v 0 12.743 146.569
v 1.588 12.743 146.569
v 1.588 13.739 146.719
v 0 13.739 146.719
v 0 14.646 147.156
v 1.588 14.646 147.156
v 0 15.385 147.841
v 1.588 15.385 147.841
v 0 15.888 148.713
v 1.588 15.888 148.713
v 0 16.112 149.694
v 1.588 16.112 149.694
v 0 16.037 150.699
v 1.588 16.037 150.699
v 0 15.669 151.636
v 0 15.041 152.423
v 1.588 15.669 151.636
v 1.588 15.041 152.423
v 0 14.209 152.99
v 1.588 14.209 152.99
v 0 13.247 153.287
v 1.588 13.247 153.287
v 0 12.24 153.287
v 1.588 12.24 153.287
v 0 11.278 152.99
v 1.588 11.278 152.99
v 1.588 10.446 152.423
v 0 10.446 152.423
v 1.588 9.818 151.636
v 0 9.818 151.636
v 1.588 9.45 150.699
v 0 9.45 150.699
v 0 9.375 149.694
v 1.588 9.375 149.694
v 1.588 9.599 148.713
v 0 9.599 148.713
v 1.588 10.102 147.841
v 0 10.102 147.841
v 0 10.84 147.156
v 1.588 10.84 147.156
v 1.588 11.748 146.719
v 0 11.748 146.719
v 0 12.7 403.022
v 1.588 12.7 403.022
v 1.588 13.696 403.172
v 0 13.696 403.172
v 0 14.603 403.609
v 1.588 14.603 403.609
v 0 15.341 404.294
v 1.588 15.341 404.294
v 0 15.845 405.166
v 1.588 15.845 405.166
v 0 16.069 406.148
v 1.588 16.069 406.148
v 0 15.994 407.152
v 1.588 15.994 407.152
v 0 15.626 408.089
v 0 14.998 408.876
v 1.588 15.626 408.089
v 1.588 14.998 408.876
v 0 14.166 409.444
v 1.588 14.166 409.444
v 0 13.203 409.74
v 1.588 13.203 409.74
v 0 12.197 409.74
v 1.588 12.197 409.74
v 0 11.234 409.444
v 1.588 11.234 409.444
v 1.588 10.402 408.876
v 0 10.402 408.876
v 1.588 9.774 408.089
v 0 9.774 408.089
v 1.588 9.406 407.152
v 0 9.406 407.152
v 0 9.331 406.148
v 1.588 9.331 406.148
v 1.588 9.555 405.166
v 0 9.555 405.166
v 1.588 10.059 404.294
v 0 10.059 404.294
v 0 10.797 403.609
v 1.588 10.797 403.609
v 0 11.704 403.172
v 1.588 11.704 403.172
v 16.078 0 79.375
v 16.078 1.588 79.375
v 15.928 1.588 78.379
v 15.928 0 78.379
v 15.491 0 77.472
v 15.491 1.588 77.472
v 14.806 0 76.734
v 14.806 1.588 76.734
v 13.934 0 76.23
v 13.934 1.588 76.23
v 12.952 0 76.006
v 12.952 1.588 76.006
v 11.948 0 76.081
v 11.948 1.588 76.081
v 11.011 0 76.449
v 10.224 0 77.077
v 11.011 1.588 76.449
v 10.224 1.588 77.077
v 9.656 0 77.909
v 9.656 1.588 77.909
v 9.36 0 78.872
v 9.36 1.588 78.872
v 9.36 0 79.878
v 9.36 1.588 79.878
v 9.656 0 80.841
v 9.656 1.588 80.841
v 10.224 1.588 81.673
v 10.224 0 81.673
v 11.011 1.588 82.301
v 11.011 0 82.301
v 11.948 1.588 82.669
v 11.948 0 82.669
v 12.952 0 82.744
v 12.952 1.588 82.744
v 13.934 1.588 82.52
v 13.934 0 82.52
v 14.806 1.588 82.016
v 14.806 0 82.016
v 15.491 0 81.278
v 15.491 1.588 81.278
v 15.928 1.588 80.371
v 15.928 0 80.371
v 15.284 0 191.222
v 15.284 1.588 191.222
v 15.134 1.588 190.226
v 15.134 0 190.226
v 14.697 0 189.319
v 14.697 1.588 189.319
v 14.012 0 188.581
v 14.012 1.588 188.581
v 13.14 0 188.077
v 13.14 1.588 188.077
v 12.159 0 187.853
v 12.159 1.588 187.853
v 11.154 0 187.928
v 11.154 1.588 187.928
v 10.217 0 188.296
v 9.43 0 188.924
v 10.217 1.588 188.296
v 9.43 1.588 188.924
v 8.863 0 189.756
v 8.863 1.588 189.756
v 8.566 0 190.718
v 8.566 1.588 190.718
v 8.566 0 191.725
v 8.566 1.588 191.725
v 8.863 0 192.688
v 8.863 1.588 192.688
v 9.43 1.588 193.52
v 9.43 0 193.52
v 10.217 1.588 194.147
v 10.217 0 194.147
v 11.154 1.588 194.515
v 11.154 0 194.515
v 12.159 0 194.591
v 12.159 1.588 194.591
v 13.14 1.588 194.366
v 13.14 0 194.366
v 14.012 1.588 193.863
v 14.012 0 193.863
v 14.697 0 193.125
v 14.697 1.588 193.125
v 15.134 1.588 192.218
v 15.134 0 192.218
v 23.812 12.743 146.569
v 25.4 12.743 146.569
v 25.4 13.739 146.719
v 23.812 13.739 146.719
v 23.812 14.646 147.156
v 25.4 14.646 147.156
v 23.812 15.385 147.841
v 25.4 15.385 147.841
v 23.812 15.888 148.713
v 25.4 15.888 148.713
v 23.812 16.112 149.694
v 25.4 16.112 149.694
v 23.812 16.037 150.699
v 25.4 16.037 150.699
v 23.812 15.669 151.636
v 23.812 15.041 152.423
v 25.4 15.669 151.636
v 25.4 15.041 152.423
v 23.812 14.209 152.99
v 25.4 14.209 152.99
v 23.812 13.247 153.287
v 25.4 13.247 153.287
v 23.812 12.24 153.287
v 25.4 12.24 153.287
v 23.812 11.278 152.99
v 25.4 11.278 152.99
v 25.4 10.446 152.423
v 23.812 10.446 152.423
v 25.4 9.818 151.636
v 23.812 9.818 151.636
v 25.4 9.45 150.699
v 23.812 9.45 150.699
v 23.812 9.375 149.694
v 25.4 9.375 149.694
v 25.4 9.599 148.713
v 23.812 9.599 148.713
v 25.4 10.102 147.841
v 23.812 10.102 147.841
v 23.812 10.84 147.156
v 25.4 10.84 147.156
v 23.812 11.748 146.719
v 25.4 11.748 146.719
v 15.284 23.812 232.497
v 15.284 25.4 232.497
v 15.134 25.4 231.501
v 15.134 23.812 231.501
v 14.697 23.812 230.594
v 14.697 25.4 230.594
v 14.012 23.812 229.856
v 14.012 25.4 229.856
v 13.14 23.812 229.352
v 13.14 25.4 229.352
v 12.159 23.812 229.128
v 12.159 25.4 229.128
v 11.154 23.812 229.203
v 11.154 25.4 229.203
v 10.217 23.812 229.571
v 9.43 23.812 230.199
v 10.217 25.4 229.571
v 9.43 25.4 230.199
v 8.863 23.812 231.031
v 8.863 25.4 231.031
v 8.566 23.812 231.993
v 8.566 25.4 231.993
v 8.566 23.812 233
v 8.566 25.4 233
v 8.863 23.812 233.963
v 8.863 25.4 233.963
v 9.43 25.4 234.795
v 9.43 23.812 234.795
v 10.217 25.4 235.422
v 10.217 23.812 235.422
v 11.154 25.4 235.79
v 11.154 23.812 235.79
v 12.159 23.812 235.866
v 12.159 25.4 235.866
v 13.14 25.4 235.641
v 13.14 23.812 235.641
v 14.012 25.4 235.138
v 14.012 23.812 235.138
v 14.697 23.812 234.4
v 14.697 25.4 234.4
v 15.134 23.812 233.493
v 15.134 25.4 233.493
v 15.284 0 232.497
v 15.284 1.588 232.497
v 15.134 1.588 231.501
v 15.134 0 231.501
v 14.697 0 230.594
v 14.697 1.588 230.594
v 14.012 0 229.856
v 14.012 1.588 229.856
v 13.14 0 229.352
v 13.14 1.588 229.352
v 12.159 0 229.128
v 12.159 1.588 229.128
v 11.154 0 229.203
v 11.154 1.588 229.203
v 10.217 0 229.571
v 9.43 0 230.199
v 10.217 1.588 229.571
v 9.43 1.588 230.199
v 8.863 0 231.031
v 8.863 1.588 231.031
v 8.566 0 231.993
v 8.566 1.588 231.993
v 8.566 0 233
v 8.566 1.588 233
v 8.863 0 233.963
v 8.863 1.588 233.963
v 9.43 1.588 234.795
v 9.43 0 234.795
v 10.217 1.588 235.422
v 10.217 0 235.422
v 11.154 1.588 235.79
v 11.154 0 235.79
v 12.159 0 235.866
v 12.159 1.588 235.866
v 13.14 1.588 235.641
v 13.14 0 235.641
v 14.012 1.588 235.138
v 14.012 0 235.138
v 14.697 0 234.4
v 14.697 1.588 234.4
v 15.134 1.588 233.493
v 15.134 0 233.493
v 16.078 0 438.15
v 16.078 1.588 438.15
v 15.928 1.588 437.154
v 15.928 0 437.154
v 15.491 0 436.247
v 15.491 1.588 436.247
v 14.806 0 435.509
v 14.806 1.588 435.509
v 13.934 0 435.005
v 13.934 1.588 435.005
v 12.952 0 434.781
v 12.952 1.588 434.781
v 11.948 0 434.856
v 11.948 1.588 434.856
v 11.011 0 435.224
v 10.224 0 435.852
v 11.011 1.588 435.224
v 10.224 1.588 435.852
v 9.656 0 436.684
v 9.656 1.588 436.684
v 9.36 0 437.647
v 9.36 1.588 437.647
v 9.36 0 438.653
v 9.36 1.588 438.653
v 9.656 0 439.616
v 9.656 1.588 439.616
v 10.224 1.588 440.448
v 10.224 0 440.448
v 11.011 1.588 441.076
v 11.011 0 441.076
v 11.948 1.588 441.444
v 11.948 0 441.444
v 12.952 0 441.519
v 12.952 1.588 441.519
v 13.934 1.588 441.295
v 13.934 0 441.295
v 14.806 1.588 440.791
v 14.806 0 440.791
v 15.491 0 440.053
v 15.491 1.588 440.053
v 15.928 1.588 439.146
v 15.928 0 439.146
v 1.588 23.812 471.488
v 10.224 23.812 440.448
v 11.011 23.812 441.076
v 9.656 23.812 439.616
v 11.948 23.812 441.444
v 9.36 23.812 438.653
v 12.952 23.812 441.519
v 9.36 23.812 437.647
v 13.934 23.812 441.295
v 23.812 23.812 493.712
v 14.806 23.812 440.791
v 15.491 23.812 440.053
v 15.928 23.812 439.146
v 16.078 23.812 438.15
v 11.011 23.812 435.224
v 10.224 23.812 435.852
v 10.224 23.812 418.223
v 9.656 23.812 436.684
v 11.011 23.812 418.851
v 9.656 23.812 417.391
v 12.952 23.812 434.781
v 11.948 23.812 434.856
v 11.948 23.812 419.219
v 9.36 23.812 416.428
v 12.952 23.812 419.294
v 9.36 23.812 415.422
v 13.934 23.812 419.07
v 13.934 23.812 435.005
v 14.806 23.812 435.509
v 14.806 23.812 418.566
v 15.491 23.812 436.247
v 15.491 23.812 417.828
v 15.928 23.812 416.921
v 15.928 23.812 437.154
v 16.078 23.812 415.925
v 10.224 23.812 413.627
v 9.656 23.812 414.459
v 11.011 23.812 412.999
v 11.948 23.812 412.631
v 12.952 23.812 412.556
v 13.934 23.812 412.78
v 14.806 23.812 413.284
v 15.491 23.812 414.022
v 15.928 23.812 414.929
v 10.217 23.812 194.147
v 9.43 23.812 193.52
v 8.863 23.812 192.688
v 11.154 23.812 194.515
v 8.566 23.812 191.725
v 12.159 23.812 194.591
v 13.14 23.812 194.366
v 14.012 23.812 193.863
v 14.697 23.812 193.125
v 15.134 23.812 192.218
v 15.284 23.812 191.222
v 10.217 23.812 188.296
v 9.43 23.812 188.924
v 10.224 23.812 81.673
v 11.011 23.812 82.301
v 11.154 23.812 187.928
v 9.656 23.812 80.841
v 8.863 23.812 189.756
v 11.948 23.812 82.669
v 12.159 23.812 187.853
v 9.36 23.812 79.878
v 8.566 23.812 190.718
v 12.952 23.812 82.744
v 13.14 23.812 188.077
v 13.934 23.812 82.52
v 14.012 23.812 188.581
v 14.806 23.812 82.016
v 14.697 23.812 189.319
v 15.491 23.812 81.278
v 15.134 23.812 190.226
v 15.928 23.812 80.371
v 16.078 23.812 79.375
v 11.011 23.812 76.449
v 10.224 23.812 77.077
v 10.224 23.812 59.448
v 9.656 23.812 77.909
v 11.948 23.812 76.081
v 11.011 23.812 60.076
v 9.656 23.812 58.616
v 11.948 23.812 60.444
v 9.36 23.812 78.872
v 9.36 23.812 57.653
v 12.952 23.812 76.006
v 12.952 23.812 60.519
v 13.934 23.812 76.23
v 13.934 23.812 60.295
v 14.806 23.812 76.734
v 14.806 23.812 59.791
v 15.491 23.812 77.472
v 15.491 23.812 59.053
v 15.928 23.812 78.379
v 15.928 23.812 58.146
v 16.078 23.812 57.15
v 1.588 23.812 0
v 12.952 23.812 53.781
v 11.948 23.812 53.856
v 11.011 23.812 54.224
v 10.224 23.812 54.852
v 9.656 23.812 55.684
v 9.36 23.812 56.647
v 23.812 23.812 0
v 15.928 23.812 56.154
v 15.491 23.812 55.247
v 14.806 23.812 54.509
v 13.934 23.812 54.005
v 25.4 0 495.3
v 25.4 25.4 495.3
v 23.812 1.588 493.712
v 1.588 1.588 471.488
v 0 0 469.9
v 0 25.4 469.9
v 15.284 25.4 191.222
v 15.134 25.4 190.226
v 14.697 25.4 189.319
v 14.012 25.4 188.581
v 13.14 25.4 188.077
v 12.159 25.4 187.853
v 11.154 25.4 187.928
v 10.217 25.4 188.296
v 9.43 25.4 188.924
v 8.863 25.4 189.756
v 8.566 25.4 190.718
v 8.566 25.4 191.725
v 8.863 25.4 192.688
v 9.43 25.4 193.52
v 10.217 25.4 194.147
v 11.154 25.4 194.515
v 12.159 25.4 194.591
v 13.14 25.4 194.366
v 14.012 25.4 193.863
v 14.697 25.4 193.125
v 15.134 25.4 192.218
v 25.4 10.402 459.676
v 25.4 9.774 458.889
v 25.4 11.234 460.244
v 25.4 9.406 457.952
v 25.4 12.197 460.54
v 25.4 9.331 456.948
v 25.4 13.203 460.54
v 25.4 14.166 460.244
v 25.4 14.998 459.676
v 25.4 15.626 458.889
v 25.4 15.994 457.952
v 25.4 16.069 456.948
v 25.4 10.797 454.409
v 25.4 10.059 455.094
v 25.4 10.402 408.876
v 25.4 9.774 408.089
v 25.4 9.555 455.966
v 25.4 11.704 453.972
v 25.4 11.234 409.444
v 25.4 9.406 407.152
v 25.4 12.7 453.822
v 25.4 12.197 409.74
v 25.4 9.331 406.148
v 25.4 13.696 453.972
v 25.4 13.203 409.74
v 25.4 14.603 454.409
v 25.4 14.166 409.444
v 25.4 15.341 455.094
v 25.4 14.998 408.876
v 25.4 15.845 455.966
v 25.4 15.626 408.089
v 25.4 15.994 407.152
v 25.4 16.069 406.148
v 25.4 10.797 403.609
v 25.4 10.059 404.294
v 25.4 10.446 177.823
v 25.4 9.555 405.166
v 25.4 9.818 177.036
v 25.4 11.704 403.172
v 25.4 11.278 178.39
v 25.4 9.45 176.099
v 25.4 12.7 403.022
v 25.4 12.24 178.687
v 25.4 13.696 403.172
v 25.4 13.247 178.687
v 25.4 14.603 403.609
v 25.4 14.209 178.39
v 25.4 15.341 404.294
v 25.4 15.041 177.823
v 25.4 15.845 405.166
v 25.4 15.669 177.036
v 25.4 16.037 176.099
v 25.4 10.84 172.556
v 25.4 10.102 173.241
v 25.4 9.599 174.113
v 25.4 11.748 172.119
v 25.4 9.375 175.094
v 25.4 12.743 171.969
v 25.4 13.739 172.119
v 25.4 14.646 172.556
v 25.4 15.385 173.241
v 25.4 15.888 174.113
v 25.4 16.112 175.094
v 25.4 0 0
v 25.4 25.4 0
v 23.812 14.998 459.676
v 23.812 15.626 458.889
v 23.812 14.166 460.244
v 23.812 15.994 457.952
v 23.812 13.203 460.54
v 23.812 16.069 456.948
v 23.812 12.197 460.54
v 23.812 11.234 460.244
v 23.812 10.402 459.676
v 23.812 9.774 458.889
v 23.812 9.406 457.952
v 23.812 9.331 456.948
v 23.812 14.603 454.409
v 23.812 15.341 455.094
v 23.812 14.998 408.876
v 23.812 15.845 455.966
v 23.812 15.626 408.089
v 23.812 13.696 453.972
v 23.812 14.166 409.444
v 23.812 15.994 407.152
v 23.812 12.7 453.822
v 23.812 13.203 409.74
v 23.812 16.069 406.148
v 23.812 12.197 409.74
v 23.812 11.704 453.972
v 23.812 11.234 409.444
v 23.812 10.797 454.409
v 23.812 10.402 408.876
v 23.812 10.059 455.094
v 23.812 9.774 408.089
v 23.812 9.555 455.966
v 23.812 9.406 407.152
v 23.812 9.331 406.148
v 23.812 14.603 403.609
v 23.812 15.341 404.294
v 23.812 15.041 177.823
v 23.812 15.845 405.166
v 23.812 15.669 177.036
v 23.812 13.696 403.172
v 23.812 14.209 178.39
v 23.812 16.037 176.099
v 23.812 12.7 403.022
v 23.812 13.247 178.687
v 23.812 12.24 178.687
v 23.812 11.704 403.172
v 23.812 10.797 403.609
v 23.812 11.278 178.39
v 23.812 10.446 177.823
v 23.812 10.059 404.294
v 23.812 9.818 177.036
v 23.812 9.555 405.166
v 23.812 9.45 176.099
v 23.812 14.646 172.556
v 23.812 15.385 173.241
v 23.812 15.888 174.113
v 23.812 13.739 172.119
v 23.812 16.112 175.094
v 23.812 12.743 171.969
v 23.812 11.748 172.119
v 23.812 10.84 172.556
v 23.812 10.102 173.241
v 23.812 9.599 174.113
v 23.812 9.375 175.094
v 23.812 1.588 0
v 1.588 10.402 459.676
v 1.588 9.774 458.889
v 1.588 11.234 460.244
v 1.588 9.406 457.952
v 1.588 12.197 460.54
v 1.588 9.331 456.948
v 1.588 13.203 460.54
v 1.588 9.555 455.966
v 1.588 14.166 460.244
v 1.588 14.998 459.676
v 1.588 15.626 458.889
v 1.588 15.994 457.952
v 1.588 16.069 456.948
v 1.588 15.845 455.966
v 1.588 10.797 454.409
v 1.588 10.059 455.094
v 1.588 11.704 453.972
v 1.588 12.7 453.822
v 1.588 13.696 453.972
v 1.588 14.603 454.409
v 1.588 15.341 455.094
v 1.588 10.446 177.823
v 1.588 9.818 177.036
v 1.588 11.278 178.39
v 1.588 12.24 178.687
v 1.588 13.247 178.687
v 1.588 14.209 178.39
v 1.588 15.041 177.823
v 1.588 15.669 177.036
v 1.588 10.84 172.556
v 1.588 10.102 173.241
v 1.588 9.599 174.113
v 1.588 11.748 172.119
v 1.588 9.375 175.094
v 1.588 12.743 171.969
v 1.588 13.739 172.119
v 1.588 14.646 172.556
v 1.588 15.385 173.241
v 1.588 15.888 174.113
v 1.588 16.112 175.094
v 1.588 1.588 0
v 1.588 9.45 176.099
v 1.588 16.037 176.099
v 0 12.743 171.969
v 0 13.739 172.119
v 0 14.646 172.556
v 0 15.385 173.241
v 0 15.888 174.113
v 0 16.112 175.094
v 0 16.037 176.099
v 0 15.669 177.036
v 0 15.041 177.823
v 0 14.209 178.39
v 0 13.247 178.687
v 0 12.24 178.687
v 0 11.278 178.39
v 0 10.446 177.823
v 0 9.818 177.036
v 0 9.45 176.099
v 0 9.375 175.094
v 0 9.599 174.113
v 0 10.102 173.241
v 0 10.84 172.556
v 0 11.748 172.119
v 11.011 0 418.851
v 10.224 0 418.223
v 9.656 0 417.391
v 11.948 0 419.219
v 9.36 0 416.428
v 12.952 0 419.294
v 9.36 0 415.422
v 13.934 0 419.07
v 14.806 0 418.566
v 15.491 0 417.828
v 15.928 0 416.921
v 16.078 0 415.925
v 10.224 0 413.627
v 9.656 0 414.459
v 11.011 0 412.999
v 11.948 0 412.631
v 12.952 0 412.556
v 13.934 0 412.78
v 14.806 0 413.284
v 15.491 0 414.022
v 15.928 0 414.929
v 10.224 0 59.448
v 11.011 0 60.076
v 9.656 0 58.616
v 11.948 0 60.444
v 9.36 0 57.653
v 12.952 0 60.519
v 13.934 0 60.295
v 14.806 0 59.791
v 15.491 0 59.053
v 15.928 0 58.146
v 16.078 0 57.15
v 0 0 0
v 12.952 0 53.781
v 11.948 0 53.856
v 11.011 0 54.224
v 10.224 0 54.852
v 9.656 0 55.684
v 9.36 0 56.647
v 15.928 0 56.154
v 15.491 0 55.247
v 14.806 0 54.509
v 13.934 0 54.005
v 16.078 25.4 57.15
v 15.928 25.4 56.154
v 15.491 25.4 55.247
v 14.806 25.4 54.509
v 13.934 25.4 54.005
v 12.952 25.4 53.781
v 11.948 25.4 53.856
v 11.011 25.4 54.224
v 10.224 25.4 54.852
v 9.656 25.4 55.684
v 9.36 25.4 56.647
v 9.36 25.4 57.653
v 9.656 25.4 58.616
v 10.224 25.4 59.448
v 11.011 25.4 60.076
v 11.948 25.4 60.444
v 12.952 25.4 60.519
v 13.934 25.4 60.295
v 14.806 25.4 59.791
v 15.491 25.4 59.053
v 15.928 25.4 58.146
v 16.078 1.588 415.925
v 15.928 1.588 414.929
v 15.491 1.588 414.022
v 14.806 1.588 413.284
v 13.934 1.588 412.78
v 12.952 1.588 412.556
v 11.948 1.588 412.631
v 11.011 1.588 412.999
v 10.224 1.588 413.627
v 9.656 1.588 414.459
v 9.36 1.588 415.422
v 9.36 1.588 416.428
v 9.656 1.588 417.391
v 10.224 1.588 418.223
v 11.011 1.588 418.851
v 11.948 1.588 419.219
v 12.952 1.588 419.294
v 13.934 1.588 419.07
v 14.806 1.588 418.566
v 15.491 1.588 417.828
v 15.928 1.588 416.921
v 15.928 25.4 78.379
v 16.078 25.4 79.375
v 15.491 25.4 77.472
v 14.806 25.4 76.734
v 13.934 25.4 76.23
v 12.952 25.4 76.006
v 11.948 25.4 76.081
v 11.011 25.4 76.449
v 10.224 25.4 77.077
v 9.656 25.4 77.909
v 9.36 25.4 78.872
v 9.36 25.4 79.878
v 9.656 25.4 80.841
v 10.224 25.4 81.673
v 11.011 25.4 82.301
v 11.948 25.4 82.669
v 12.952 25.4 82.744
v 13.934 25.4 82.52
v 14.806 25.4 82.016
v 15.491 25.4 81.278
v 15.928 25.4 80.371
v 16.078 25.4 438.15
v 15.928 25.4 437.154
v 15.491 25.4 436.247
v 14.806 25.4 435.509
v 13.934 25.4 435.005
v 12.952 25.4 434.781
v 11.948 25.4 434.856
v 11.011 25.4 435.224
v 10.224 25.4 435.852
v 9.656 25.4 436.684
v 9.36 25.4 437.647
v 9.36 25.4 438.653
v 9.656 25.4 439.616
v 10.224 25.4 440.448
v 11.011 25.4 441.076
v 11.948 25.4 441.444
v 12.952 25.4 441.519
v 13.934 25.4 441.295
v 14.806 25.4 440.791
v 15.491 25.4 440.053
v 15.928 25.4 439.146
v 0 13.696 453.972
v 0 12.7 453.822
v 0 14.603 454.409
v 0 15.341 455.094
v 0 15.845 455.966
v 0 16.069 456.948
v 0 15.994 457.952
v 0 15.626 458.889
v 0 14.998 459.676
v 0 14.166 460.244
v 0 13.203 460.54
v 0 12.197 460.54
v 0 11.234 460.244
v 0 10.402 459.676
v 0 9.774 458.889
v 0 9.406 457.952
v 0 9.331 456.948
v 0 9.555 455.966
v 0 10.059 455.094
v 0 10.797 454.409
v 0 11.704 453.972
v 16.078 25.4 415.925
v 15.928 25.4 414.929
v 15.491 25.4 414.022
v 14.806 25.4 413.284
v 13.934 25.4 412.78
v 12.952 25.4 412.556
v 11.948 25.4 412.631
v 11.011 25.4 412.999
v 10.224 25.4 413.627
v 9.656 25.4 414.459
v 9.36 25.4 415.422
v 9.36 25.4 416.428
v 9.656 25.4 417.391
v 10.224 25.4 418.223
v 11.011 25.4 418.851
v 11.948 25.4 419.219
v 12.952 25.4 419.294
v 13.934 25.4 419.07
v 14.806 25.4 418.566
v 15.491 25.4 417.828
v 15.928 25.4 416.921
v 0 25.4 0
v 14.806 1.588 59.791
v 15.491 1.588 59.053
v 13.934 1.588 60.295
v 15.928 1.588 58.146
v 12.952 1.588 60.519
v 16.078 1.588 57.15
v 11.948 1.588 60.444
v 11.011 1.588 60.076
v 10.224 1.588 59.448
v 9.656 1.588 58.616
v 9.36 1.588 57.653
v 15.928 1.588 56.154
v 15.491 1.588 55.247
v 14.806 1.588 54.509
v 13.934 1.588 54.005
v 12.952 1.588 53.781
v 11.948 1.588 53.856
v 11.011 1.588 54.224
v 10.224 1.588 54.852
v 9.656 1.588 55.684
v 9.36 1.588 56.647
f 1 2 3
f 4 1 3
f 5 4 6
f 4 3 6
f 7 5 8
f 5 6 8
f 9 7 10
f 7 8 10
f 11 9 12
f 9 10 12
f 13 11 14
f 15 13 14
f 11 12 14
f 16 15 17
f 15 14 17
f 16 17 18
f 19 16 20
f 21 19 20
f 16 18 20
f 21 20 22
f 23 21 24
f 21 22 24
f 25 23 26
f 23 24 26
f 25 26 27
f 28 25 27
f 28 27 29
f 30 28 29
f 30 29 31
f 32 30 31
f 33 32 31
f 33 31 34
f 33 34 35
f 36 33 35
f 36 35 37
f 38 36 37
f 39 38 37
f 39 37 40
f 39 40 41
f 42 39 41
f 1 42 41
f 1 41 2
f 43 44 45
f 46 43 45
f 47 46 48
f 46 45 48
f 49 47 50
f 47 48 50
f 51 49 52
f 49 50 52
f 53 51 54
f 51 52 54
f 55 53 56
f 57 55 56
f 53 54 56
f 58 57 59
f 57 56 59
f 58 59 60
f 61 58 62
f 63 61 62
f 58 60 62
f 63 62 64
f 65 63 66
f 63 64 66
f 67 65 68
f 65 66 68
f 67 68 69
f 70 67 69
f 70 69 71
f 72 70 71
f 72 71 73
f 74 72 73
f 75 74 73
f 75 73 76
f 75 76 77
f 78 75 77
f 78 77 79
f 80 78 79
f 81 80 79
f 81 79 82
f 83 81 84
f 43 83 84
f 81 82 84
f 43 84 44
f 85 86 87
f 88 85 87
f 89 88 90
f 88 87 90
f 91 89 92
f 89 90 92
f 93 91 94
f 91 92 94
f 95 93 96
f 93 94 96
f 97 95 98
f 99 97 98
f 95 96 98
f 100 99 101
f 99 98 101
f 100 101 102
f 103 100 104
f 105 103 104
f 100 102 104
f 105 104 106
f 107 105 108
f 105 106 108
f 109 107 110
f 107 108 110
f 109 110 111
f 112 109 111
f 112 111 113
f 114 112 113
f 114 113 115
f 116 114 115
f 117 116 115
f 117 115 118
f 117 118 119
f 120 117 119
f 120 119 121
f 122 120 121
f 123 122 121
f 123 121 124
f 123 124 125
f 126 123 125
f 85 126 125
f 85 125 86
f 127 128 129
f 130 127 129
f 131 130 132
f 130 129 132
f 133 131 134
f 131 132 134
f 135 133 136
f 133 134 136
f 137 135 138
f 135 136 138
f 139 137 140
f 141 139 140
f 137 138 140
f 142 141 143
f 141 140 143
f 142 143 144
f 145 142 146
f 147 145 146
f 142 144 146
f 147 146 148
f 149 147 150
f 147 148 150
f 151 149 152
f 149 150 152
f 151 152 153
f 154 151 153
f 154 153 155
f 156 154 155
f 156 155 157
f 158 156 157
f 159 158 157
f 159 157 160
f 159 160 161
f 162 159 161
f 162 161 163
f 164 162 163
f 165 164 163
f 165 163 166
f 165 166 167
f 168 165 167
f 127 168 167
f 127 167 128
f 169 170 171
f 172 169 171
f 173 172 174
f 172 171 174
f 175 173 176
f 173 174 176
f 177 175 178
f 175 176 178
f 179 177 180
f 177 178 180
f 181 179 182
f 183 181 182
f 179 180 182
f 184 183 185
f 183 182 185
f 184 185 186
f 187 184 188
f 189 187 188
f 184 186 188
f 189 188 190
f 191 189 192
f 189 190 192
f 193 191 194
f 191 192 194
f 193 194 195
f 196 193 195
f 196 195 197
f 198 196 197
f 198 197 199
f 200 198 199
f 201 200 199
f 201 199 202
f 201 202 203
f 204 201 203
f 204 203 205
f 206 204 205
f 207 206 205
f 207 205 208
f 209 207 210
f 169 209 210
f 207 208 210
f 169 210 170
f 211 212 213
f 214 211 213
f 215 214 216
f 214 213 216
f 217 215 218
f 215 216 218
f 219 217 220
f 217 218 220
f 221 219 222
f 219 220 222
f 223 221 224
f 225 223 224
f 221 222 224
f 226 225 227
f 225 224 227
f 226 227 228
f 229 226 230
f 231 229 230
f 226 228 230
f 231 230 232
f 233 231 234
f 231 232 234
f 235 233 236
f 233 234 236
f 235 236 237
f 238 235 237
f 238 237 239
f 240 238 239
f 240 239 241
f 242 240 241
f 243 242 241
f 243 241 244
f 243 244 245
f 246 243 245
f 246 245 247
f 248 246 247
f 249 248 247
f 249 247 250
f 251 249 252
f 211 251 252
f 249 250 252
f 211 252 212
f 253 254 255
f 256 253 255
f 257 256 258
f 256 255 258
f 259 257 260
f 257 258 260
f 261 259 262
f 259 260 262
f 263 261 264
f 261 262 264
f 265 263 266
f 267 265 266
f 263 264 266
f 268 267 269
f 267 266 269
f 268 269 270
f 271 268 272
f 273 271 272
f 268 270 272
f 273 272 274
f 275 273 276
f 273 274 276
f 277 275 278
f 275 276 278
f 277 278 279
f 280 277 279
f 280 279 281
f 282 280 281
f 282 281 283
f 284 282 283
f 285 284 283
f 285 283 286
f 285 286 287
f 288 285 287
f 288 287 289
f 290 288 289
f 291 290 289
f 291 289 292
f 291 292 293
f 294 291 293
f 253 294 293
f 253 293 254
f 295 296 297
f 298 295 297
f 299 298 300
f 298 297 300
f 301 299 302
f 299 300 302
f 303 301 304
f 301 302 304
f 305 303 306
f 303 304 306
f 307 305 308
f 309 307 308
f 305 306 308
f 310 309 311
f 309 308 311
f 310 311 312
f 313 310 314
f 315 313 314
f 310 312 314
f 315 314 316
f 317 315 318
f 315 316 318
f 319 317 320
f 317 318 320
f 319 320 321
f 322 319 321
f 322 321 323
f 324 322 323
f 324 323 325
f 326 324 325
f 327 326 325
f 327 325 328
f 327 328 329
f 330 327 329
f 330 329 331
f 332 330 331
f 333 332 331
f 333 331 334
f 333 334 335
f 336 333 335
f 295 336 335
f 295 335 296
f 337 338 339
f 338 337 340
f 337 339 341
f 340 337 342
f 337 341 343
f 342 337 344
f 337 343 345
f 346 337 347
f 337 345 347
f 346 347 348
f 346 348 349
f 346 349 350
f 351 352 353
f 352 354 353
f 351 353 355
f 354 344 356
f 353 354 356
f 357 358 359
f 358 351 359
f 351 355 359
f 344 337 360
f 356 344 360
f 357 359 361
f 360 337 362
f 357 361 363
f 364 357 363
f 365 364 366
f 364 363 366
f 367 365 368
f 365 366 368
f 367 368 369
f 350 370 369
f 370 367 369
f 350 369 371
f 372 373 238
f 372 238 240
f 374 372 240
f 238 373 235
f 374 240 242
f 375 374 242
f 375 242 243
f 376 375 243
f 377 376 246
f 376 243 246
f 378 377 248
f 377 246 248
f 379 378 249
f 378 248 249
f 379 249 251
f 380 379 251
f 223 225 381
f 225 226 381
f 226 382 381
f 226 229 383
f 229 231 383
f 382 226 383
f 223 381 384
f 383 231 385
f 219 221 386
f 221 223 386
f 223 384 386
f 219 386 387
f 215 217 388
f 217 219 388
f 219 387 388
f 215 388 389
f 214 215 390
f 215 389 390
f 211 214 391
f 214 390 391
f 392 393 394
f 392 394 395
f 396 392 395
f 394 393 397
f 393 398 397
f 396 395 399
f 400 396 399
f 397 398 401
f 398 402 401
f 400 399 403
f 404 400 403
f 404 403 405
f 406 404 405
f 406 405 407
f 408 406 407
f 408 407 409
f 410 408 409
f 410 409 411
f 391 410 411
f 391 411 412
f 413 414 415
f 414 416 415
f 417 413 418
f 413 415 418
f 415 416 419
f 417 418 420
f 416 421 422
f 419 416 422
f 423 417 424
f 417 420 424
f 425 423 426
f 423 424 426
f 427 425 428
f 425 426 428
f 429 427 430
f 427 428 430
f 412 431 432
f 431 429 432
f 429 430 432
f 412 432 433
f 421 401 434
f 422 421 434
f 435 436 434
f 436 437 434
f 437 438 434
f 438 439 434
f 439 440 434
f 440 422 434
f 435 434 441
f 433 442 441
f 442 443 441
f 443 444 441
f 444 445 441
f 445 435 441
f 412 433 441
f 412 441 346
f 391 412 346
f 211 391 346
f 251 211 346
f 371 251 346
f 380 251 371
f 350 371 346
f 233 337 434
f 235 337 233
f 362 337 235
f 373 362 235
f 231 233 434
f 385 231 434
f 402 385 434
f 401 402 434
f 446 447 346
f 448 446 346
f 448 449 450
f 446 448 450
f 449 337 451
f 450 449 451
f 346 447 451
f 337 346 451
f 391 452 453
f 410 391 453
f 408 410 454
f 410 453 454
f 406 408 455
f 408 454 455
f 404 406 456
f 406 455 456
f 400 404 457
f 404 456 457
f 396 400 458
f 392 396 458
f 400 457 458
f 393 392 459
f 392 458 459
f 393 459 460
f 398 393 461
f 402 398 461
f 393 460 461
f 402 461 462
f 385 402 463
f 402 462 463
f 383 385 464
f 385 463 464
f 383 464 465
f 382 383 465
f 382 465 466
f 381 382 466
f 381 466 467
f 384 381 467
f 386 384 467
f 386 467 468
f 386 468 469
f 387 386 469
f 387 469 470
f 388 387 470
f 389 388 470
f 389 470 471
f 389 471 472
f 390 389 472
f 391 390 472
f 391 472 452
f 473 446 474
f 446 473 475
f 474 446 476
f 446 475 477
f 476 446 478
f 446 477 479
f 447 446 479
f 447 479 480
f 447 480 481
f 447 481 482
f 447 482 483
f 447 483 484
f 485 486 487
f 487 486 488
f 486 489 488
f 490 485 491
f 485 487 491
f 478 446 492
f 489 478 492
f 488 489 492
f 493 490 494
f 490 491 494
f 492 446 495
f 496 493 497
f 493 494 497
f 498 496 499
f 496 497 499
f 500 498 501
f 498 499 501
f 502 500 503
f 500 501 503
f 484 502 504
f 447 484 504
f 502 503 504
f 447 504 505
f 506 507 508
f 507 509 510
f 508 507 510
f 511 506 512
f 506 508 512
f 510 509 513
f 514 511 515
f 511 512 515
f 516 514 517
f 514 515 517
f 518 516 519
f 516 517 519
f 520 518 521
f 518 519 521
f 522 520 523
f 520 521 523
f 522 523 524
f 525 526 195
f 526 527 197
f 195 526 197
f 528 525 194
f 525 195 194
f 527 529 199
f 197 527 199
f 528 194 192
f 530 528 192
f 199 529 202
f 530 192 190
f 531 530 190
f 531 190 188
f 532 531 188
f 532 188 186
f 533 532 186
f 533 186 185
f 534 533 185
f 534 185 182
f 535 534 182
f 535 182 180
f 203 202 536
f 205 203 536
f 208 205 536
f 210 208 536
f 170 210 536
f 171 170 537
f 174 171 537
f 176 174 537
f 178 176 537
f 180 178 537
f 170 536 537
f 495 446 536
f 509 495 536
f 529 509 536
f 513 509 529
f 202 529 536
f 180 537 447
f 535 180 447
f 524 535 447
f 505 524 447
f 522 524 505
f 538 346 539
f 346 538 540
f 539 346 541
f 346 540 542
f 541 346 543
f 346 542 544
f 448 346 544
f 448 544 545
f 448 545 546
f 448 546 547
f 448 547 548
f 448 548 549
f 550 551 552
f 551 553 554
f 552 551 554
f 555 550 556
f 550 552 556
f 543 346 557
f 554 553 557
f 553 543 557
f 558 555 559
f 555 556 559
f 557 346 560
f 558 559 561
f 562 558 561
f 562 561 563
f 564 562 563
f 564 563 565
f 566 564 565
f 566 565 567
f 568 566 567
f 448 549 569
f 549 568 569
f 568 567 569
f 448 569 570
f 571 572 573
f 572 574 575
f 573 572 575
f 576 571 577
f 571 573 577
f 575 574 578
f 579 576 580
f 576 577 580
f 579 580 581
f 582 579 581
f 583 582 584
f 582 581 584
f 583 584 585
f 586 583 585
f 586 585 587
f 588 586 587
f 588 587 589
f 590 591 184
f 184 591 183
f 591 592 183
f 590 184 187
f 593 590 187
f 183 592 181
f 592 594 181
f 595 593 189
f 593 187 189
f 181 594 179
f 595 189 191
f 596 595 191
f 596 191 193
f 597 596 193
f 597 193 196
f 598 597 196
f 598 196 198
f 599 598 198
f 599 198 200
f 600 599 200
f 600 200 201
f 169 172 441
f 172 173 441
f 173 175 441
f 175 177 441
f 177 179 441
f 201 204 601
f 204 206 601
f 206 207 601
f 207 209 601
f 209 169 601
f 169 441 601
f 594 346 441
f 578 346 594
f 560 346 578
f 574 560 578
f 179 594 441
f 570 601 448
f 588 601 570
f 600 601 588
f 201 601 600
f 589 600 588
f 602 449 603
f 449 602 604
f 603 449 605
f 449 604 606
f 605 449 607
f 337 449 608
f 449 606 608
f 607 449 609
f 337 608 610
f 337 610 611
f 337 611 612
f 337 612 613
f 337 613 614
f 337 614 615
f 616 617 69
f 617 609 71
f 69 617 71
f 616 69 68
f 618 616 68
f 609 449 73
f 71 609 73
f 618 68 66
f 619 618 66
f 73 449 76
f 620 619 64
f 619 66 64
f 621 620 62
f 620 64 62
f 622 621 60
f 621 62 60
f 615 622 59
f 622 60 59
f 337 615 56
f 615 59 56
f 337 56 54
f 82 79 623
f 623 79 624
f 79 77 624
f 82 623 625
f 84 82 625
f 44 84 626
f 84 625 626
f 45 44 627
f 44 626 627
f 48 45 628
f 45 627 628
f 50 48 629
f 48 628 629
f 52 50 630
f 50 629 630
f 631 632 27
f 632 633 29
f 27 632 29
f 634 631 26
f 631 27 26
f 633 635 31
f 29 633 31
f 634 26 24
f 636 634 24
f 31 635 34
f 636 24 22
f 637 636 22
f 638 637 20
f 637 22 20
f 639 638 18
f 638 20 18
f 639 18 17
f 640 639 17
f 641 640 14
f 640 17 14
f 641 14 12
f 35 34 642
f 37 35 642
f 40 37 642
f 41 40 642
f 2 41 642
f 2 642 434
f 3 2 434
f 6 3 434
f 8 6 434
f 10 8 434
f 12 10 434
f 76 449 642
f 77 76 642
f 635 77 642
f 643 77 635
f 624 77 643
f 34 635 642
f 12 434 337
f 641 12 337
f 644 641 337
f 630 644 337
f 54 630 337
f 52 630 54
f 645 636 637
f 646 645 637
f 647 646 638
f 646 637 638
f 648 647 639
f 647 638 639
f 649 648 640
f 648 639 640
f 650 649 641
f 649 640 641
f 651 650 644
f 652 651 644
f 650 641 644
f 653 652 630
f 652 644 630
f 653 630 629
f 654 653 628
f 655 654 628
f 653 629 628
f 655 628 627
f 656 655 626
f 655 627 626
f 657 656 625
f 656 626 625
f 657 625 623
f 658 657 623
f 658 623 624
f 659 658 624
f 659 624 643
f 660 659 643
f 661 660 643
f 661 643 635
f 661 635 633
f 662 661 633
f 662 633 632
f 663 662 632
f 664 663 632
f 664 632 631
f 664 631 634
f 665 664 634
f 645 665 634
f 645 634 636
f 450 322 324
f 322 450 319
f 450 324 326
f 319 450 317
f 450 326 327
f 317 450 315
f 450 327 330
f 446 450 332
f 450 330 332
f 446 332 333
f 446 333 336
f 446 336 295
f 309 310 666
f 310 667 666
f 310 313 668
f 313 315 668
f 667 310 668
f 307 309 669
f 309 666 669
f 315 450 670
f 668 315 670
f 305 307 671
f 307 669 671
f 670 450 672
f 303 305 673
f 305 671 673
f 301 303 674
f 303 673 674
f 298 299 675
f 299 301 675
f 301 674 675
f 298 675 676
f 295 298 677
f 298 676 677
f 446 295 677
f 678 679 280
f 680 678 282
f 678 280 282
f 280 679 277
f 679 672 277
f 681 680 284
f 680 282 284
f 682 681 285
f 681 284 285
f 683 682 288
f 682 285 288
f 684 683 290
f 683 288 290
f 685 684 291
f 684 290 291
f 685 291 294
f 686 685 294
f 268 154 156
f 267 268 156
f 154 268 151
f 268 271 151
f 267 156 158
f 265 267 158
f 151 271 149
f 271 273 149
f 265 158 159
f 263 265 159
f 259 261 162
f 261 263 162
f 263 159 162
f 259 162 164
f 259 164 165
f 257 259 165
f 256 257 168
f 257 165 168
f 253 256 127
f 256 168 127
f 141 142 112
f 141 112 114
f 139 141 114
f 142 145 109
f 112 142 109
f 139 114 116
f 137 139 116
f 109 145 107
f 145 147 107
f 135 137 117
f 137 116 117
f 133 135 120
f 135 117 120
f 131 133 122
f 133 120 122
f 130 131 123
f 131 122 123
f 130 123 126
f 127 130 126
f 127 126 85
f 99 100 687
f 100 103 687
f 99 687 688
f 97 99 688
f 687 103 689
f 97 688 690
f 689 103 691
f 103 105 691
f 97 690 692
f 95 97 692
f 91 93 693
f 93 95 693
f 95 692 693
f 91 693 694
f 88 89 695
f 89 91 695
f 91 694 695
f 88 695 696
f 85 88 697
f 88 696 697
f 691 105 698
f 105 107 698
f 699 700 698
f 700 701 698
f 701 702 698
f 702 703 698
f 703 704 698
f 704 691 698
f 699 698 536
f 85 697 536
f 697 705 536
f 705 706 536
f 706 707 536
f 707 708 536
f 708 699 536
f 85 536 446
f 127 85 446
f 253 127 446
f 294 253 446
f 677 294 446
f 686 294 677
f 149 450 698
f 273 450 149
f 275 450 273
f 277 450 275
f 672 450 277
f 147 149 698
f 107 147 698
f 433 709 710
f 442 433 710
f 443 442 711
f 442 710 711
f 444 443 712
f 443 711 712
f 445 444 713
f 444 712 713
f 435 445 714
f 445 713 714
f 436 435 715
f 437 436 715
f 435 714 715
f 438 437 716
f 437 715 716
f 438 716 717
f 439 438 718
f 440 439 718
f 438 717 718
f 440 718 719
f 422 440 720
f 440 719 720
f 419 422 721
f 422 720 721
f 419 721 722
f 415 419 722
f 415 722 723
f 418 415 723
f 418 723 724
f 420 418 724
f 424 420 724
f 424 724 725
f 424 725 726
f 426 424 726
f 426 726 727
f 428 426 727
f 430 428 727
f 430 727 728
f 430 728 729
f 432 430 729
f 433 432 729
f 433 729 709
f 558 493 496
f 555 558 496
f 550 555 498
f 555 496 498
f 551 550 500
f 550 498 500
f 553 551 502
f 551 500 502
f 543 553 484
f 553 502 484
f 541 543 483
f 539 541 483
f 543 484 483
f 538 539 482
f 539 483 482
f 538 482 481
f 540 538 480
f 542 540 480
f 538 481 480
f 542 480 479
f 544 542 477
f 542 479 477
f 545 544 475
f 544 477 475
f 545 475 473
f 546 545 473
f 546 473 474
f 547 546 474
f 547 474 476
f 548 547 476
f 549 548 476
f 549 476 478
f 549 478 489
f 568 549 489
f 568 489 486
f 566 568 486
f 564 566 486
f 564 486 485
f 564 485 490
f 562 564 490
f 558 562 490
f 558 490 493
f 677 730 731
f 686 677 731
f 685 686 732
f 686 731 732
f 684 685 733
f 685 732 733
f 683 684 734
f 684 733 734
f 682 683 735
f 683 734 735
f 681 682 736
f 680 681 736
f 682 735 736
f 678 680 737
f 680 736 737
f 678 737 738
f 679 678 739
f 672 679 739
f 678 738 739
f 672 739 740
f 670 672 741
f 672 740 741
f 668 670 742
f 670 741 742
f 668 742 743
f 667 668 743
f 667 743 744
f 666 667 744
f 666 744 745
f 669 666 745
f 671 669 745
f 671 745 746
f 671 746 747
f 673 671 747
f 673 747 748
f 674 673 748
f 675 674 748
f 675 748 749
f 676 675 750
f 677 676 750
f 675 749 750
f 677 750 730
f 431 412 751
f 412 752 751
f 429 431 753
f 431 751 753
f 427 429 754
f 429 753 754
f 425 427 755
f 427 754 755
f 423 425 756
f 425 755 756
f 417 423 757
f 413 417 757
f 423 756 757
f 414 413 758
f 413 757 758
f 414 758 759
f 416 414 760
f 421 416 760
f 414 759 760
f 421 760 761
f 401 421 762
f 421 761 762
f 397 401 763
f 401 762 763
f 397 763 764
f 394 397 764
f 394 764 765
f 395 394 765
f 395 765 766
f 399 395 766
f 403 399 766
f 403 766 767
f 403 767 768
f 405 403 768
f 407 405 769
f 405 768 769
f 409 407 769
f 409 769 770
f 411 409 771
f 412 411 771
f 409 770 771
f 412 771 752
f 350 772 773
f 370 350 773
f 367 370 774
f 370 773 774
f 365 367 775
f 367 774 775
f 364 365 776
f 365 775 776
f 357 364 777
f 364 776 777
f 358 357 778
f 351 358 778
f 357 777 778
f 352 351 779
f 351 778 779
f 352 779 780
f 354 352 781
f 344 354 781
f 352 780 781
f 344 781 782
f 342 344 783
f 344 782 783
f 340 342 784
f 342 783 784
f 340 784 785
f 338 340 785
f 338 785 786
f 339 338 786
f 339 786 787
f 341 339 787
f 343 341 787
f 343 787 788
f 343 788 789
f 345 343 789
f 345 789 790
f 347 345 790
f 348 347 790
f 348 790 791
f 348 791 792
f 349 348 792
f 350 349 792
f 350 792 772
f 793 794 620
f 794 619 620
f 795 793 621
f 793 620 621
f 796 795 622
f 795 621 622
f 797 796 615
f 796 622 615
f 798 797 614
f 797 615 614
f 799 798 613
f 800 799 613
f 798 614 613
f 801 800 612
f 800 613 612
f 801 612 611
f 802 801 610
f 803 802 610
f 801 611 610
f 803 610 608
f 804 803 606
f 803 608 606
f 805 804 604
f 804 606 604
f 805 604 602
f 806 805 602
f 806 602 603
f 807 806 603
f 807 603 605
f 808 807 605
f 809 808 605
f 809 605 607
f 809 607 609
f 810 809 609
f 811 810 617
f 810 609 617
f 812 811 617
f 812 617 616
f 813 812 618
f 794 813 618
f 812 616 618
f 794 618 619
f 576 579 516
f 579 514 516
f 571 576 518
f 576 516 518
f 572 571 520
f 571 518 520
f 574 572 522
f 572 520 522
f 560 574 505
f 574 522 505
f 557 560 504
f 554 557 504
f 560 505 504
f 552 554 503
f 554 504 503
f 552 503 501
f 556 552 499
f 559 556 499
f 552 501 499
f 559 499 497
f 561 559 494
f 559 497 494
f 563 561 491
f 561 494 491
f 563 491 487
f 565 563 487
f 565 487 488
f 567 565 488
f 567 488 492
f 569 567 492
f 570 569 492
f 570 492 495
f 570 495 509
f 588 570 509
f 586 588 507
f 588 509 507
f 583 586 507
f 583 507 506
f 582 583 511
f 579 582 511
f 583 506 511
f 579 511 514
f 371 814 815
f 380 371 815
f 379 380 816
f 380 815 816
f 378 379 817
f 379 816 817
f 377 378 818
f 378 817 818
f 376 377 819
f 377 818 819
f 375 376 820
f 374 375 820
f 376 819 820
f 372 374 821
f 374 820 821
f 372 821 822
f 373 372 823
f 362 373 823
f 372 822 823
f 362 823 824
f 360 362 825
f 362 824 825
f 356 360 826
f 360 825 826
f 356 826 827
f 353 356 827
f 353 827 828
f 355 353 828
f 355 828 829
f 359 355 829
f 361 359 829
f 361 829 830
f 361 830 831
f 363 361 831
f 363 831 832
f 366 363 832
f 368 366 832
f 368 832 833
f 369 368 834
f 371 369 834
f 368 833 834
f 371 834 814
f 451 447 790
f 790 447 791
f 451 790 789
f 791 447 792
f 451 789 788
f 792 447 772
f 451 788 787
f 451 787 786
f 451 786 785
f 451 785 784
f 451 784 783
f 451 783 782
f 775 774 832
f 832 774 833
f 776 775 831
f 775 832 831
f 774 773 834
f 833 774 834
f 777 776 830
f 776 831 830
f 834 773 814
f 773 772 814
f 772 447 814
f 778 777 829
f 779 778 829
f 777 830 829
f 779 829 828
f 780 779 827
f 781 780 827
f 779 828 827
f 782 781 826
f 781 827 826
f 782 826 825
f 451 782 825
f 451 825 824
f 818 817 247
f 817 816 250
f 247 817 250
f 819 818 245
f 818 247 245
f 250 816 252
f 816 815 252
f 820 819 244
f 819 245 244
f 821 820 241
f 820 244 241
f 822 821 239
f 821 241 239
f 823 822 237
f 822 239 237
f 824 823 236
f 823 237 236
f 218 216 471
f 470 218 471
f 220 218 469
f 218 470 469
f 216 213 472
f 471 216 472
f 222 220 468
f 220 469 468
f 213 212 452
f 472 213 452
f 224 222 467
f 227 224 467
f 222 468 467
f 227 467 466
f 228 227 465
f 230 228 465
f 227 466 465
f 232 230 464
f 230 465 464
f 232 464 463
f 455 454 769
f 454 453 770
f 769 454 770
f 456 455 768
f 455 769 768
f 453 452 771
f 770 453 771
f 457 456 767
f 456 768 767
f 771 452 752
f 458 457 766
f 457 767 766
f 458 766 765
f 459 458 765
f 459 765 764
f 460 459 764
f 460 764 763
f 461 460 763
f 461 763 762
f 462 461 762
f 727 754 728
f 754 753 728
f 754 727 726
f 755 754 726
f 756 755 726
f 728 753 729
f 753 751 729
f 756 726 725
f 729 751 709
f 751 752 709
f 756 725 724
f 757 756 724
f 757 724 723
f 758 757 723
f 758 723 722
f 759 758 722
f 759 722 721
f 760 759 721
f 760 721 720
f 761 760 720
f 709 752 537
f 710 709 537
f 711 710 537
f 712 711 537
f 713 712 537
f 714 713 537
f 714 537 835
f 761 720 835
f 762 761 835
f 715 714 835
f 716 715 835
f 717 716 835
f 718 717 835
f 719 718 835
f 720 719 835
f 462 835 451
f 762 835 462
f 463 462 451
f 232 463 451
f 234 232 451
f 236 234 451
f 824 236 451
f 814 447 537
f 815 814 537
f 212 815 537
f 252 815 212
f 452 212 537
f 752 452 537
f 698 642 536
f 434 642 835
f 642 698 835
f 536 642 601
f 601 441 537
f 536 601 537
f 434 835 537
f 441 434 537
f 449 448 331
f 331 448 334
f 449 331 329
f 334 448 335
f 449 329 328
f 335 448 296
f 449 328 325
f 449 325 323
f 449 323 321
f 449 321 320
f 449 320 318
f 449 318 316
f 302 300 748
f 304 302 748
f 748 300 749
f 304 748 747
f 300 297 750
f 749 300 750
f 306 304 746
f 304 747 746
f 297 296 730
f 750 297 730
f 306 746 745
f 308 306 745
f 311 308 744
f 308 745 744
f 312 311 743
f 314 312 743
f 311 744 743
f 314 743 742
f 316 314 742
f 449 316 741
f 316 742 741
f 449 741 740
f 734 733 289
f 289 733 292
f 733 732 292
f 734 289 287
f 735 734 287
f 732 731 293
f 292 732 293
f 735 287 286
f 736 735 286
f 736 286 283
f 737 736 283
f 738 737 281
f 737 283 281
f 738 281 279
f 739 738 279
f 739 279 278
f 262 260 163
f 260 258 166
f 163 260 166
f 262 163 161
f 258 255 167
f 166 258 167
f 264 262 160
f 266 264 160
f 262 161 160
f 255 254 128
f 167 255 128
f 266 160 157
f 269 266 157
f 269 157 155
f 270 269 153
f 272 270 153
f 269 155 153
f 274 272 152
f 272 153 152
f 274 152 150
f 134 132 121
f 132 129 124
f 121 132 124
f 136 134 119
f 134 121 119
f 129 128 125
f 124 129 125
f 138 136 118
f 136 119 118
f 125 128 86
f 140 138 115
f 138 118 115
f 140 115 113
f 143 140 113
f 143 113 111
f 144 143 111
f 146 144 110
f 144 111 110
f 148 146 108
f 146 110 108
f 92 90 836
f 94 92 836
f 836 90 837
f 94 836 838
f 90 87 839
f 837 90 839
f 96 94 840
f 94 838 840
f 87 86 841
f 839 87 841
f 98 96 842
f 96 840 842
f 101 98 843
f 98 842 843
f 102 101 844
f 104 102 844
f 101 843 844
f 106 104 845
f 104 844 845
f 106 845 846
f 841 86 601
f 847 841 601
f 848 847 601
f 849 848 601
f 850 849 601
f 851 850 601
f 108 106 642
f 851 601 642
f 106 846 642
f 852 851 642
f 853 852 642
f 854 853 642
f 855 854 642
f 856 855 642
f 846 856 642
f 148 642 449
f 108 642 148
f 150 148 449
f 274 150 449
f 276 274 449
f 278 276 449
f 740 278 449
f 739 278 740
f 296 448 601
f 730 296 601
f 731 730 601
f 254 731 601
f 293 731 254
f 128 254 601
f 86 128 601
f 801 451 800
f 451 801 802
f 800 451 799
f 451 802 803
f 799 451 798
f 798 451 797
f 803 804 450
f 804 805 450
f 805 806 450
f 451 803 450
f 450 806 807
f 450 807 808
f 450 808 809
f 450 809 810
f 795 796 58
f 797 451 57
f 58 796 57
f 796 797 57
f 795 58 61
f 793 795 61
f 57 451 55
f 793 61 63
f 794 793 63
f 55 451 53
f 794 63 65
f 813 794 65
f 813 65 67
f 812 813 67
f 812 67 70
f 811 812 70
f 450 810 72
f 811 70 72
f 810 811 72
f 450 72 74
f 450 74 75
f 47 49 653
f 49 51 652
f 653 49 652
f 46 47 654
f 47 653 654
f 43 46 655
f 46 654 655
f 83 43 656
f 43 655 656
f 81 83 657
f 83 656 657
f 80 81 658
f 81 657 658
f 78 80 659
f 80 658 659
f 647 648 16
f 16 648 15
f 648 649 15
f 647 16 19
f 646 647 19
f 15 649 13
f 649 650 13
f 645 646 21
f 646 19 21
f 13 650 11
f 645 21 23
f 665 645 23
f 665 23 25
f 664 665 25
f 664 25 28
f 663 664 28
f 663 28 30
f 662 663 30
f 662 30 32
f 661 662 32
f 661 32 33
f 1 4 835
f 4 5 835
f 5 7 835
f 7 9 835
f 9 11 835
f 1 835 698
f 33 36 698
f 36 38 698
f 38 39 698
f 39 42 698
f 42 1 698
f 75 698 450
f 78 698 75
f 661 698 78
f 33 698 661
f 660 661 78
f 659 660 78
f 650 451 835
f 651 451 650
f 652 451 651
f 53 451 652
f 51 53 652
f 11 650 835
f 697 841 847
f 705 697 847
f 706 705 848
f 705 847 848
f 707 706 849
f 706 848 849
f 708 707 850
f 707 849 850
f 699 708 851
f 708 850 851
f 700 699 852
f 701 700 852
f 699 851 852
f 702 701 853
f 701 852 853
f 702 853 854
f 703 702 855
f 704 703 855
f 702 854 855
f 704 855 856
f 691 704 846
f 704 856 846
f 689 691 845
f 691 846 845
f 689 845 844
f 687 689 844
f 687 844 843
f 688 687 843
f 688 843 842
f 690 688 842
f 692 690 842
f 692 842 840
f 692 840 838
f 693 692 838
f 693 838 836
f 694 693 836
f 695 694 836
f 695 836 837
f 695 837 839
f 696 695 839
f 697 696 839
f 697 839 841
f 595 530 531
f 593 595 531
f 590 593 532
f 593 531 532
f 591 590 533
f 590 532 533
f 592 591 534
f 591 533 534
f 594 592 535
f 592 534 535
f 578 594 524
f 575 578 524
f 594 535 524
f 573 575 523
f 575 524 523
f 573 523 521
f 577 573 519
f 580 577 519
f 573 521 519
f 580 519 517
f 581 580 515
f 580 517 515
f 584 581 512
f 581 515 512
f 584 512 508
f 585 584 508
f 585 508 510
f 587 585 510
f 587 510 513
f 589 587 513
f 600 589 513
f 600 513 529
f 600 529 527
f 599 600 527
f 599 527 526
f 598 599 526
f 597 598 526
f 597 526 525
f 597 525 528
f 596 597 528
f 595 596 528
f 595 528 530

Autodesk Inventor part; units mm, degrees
ref_plane "YZ Plane" through (0, 0, 0) normal (1, 0, 0) x (0, 1, 0)
ref_plane "XZ Plane" through (0, 0, 0) normal (0, 1, 0) x (-1, 0, 0)
ref_plane "XY Plane" through (0, 0, 0) normal (0, 0, 1) x (1, 0, 0)
sketch "Sketch1" plane through (0, 0, 0) normal (0, 0, 1) x (1, 0, 0)
  line L0 (0, 0) -> (25.4, 0)
  line L1 (25.4, 0) -> (25.4, 25.4)
  line L2 (25.4, 25.4) -> (0, 25.4)
  line L3 (0, 25.4) -> (0, 0)
  line L4 (1.5875, 23.8125) -> (23.8125, 23.8125)
  line L5 (23.8125, 23.8125) -> (23.8125, 1.5875)
  line L6 (23.8125, 1.5875) -> (1.5875, 1.5875)
  line L7 (1.5875, 1.5875) -> (1.5875, 23.8125)
  dimension "d0" = 25.4
  dimension "d1" = 25.4
  dimension "d2" = 1.5875
extrude "Extrusion1" add sketch "Sketch1" along normal blind 495.3
sketch "Sketch2" plane through (0, 25.4, 0) normal (0, 1, 0) x (1, 0, 0)
  line L0 (25.4, 0) -> (0, 0) projected
  line L1 (0, 0) -> (0, -495.3) projected
  line L2 (25.4, -495.3) -> (0, -495.3) projected
  line L3 (12.7, 0) -> (12.7, -495.3) construction
  line L4 (25.4, -495.3) -> (0, -469.9)
  circle A0 centre (12.7, -79.375) radius 3.3782 projected
  circle A1 centre (12.7, -57.15) radius 3.3782 projected
  circle A2 centre (12.7, -438.15) radius 3.3782 projected
  circle A3 centre (12.7, -415.925) radius 3.3782 projected
  circle A4 centre (11.9062, -191.2218) radius 3.3782 projected
  circle A5 centre (11.9062, -232.4968) radius 3.3782 projected
  line L5 (-2.6988, -143.5968) -> (-2.6988, -242.0218) construction
  line L6 (24.6062, -242.0218) -> (-2.6988, -242.0218) construction
  line L7 (24.6062, -143.5968) -> (24.6062, -242.0218) projected
  line L8 (-2.6988, -143.5968) -> (24.6062, -143.5968) construction
  dimension "d6" = 45
extrude "Extrusion2" cut sketch "Sketch2" against normal blind 25.4
sketch "Sketch3" plane through (25.4, 0, 0) normal (1, 0, 0) x (0, 0, -1)
  circle A0 centre (-149.9468, 12.7434) radius 3.3782 projected
  circle A1 centre (-175.3468, 12.7434) radius 3.3782 projected
  circle A2 centre (-406.4, 12.7) radius 3.3782 projected
  circle A3 centre (-457.2, 12.7) radius 3.3782 projected
extrude "Extrusion3" cut sketch "Sketch3" against normal blind 25.4
properties part number "Rebuild Shooter Tower Top Tube 1" material "Aluminum 6061"
